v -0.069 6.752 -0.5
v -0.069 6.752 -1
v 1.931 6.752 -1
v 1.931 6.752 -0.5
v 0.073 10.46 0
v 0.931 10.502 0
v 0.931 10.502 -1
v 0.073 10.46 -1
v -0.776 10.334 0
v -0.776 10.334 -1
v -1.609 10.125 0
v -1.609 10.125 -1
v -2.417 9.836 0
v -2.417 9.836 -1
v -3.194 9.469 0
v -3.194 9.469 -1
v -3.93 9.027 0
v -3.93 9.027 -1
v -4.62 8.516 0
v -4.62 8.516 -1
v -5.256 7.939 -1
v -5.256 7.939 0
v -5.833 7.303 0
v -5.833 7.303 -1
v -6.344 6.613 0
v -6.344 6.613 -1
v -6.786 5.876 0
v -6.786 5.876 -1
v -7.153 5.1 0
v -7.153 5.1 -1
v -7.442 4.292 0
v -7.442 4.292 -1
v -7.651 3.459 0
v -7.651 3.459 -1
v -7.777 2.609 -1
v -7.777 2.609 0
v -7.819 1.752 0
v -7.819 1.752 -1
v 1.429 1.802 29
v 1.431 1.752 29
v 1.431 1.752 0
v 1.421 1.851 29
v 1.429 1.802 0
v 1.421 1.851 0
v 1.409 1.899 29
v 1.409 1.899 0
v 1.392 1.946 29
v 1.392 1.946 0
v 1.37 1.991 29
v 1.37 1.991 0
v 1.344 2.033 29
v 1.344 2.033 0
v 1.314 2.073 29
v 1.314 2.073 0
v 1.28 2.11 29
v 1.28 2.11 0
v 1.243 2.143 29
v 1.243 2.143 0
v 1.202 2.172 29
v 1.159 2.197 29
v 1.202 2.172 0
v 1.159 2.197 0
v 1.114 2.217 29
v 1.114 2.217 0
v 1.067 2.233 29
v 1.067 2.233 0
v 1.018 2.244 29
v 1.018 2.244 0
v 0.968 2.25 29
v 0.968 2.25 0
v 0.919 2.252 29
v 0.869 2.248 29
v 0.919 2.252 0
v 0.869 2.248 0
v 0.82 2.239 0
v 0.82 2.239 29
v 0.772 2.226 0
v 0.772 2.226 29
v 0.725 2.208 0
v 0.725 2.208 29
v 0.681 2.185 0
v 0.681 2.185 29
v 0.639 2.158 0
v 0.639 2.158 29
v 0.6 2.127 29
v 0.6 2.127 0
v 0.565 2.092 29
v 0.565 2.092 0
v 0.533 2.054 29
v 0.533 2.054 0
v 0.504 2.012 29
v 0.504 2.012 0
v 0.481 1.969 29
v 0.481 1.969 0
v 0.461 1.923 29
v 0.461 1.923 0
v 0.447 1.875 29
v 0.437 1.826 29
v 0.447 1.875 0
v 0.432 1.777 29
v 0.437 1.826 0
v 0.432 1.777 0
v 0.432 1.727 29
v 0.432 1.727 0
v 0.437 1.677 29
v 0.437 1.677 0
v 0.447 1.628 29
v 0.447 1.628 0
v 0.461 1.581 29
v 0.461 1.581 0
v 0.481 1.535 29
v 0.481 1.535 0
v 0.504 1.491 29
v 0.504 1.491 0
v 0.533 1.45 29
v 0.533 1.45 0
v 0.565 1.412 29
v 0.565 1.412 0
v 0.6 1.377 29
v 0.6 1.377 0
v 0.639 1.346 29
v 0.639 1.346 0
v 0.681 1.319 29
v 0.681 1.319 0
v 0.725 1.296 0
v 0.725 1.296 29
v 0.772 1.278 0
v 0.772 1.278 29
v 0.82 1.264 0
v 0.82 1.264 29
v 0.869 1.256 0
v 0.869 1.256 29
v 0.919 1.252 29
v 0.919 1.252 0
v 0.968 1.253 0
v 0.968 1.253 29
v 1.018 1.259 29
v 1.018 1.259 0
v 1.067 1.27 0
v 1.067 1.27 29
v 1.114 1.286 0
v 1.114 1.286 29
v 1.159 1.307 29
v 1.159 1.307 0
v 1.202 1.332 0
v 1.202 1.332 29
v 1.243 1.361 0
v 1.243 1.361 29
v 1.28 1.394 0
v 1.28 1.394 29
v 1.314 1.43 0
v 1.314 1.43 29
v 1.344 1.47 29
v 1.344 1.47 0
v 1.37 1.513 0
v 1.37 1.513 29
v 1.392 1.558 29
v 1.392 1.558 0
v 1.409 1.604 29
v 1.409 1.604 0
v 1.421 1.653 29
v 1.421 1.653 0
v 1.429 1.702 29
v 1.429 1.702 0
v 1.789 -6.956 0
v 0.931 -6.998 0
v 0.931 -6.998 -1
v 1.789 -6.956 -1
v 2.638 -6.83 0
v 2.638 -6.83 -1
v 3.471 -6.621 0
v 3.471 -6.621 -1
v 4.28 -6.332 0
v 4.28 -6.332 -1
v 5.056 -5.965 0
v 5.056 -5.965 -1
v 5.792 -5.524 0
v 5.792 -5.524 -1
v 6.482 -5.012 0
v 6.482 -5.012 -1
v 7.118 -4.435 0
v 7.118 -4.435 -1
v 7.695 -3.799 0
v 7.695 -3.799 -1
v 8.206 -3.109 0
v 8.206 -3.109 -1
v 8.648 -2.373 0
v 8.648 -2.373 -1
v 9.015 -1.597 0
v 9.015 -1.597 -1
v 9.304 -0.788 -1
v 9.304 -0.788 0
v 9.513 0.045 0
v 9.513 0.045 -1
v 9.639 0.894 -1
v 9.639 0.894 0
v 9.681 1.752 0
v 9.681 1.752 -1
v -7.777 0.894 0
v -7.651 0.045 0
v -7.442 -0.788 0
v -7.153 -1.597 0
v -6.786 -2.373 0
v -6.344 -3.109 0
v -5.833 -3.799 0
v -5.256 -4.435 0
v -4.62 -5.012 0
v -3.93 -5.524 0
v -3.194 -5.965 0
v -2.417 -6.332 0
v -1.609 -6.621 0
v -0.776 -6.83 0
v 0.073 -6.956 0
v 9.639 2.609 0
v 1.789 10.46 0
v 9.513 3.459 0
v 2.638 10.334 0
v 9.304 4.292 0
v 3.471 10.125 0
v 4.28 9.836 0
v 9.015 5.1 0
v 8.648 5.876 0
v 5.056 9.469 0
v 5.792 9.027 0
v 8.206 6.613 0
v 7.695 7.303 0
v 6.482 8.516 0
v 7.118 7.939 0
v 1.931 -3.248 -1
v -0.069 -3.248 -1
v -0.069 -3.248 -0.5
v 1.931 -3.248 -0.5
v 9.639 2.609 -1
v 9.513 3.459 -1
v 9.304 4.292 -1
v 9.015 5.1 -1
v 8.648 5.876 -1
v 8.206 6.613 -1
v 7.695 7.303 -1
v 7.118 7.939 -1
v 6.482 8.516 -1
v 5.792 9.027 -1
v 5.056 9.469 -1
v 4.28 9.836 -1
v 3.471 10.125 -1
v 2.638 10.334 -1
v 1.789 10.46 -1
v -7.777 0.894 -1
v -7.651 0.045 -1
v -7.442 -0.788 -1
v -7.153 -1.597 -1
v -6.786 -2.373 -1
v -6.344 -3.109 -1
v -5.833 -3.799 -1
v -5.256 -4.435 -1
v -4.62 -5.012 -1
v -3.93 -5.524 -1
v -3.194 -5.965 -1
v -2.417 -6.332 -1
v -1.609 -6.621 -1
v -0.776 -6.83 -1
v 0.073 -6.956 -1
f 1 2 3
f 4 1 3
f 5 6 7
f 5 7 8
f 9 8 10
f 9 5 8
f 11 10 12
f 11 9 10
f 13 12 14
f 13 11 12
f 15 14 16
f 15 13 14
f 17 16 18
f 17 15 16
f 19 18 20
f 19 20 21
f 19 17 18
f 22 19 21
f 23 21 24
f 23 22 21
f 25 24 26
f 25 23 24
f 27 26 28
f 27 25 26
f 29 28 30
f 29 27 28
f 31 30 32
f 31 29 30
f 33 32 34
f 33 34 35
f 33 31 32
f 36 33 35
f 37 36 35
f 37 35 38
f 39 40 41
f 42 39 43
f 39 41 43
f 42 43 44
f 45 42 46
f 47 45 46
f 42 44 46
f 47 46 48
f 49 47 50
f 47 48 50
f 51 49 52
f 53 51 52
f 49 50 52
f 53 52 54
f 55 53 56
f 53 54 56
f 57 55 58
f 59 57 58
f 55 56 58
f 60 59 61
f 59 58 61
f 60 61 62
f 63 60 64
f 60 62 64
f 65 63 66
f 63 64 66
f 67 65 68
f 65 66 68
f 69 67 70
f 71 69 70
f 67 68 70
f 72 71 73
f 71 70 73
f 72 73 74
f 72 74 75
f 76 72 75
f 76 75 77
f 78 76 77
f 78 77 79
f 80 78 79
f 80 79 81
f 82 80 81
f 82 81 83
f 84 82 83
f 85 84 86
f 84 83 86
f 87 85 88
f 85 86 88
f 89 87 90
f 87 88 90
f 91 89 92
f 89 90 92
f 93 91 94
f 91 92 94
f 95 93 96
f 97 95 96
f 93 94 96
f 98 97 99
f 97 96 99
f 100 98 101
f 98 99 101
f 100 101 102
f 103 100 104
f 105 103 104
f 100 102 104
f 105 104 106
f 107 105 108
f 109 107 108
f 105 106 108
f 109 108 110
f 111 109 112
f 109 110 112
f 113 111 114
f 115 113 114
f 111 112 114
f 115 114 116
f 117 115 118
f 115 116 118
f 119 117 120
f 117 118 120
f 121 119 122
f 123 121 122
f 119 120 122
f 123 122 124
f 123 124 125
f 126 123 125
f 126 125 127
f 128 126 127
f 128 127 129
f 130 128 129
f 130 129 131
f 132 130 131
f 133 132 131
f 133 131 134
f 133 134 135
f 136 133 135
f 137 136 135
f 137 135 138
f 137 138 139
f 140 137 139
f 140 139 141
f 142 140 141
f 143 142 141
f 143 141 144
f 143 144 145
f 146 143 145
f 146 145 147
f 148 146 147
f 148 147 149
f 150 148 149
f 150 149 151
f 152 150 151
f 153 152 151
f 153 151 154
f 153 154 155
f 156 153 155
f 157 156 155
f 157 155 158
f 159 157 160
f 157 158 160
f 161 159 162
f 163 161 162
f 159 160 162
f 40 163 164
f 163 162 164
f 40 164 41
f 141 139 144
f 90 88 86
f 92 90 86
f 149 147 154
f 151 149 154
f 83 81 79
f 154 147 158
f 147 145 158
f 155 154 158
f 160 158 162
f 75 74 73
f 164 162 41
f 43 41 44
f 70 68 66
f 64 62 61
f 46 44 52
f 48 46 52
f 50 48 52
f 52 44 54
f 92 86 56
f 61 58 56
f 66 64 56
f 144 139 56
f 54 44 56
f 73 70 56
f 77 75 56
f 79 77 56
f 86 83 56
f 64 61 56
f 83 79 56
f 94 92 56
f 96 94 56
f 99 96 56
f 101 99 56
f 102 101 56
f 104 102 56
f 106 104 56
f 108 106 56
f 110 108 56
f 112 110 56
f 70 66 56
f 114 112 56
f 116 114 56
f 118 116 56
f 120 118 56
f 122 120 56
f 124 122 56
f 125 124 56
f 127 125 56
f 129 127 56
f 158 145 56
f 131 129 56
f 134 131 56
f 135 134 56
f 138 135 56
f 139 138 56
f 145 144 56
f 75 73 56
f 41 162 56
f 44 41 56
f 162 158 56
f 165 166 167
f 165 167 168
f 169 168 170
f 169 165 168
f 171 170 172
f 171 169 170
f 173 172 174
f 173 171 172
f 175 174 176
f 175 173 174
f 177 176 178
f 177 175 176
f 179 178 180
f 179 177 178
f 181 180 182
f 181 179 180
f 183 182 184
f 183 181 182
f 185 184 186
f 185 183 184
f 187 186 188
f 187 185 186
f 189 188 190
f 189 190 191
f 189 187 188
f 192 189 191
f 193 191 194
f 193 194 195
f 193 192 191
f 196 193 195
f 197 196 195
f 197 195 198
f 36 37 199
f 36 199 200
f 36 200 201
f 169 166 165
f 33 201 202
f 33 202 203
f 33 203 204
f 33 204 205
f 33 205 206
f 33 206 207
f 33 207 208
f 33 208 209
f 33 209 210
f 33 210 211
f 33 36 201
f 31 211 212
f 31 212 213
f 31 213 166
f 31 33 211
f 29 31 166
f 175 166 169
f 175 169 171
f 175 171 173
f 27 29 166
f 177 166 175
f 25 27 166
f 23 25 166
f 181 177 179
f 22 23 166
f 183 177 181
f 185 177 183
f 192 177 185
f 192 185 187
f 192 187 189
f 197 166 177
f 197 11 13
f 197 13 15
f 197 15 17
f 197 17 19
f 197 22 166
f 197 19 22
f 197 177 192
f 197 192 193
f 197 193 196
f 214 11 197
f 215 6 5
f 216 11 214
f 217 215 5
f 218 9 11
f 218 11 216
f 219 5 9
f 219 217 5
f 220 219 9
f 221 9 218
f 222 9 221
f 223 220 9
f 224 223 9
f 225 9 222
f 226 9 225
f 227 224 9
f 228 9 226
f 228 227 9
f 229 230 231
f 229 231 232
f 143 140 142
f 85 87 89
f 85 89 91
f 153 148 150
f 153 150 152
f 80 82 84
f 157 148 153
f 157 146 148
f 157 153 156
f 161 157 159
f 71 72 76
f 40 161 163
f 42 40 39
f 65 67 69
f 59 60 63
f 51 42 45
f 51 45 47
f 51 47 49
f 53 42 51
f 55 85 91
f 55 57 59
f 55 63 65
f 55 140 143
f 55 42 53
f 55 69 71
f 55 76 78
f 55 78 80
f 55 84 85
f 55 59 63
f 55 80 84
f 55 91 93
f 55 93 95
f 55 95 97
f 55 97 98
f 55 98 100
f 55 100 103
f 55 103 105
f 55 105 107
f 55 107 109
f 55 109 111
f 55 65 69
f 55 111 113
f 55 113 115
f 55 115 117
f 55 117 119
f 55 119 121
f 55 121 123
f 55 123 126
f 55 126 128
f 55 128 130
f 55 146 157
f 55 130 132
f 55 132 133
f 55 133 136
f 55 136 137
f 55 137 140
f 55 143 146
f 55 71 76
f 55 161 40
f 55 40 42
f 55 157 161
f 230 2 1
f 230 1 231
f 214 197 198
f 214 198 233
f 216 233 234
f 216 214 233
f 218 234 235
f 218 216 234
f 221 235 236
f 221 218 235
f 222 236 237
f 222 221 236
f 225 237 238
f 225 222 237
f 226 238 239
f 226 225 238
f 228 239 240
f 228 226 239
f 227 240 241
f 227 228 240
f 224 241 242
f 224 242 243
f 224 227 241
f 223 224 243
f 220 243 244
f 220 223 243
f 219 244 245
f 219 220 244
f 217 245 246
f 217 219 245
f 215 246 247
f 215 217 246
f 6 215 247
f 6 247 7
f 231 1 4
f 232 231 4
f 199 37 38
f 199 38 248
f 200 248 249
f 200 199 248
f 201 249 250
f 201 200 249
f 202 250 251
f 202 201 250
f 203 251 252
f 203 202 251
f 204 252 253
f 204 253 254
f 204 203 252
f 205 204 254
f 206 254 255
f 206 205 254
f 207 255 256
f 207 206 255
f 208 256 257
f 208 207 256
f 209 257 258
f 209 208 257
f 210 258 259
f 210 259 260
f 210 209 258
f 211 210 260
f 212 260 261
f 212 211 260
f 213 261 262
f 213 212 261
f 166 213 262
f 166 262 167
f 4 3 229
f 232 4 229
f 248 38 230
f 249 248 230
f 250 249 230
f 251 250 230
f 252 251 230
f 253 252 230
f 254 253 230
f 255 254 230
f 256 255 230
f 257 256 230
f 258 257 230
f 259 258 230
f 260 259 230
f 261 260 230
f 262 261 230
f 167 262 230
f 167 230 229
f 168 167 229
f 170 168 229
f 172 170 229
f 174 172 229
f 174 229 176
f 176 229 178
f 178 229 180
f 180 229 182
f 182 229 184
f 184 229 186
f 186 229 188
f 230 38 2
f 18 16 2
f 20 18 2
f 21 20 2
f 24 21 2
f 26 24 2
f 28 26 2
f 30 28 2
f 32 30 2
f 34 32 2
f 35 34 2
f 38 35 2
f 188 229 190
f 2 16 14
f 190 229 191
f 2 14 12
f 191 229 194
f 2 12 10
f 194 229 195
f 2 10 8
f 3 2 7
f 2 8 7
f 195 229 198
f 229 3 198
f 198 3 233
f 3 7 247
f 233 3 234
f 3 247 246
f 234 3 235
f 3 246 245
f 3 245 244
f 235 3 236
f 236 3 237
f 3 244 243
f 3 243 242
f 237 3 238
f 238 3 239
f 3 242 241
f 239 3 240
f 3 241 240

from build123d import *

# Parameters (mm, degrees)
F0_R     = 8.2478578746
F0_R_2   = 0.5
F1_DEPTH = 1
F2_DEPTH = 29
F3_W     = 2
F3_H     = 10
F4_DEPTH = 0.5


with BuildPart() as f1:
    # F0 (on Top) → F1 (new body)
    with BuildSketch(Plane.XY):
        with BuildLine():
            ThreePointArc((9.6811072342, 1.7517649983), (7.1182915696, 7.9389493337), (0.9311072342, 10.5017649983))
            ThreePointArc((0.9311072342, 10.5017649983), (-5.2560770936, 7.9389493412), (-7.8188927658, 1.7517650196))
            ThreePointArc((-7.8188927658, 1.7517650196), (-5.2560771201, -4.4354193182), (0.931107202, -6.9982350017))
            ThreePointArc((0.931107202, -6.9982350017), (7.1182915582, -4.4354193485), (9.6811072342, 1.7517649983))
        make_face()
        with Locations((0.9311072342, 1.7517649983)):
            Circle(F0_R, mode=Mode.SUBTRACT)
        with Locations((0.9311072342, 1.7517649983)):
            Circle(F0_R)
        with Locations((0.9311072342, 1.7517649983)):
            Circle(F0_R_2, mode=Mode.SUBTRACT)
        with Locations((0.9311072342, 1.7517649983)):
            Circle(F0_R_2)
    extrude(amount=-F1_DEPTH)

    # F3 (on face) → F4 (cut)
    with BuildSketch(Plane(origin=(0, 0, -1), x_dir=(1, 0, 0), z_dir=(0, 0, -1))):
        with Locations((0.9311072342, -1.7517649983)):
            Rectangle(F3_W, F3_H)
    extrude(amount=-F4_DEPTH, mode=Mode.SUBTRACT)


with BuildPart() as f2:
    # F0 (on Top) → F2 (new body)
    with BuildSketch(Plane.XY):
        with Locations((0.9311072342, 1.7517649983)):
            Circle(F0_R_2)
    extrude(amount=F2_DEPTH)


solid = Compound([f1.part, f2.part])
